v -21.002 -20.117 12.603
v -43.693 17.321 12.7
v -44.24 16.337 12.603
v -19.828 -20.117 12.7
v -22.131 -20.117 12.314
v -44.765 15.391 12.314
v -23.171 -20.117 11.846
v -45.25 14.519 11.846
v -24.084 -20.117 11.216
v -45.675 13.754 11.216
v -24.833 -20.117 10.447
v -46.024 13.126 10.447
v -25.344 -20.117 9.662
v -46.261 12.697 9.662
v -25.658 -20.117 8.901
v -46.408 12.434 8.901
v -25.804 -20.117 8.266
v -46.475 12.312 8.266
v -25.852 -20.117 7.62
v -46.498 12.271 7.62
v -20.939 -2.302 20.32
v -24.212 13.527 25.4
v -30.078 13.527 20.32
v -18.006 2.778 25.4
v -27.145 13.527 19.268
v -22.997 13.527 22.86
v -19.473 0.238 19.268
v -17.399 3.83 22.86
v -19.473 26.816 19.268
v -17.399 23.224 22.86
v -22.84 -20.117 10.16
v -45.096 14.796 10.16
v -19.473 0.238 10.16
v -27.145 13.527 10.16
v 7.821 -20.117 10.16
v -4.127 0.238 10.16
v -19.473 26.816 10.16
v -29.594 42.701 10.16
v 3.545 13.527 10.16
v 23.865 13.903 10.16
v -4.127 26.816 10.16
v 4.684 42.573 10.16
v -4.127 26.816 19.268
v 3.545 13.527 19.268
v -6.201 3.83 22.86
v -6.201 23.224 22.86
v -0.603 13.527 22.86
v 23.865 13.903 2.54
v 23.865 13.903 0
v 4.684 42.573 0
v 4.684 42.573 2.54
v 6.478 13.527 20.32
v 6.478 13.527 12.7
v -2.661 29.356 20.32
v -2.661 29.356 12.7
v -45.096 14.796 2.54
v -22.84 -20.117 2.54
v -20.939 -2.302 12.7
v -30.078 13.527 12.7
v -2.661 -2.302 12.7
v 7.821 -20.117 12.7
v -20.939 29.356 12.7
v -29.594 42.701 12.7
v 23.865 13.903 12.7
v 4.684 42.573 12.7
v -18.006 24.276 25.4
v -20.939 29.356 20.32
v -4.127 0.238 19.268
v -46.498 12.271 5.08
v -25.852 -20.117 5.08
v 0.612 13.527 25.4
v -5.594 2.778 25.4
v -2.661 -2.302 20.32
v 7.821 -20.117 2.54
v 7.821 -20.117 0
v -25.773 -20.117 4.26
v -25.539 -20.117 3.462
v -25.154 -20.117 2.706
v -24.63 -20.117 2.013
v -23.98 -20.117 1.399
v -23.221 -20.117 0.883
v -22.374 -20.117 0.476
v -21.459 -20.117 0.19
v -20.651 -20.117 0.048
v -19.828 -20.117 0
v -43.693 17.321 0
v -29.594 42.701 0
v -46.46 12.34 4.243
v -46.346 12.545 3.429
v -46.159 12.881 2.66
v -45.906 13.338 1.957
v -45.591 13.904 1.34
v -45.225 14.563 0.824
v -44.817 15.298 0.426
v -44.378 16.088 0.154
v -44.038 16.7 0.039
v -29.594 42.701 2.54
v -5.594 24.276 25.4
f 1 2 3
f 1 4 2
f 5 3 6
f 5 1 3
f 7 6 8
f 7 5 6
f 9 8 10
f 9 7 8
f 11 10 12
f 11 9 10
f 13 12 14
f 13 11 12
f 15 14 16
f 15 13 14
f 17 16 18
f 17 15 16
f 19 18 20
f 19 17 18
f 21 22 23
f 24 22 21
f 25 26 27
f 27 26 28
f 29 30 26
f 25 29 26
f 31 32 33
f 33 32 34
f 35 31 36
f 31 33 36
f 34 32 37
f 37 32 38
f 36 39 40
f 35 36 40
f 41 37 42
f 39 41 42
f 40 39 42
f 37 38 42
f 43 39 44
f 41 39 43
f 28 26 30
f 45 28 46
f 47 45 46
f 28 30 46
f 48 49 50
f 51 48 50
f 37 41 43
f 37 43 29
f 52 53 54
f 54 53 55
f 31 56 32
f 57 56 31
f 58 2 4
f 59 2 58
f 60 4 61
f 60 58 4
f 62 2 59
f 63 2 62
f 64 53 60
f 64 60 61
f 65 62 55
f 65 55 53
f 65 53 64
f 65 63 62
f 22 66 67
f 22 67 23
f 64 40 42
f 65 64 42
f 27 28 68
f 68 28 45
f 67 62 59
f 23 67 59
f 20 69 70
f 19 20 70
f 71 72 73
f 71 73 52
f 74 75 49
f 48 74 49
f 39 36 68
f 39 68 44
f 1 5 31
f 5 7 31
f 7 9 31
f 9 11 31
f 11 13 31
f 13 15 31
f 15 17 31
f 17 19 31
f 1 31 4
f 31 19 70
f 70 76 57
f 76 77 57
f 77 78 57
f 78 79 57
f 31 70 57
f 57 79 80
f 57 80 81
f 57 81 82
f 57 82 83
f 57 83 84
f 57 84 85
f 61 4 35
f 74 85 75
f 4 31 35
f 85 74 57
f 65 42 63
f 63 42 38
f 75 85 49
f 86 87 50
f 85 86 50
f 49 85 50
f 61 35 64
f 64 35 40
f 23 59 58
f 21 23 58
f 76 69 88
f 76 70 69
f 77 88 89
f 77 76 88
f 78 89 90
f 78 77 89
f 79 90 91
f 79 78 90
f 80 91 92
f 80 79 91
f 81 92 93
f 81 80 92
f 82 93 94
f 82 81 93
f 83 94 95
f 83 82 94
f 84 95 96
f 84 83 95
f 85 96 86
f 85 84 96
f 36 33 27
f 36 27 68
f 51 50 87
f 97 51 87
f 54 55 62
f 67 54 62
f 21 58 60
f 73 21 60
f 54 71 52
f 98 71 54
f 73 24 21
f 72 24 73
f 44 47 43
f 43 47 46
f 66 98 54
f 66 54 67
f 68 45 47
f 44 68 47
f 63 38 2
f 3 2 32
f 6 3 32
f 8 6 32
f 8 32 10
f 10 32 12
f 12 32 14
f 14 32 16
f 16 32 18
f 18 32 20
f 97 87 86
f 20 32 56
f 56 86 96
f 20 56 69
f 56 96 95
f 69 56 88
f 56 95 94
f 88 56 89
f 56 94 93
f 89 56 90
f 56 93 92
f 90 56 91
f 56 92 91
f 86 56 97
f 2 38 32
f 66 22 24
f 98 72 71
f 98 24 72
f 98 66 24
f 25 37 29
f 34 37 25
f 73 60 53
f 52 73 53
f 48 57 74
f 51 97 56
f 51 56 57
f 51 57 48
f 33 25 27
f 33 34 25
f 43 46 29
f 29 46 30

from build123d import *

# Parameters (mm, degrees)
F1_DEPTH = 12.7
F3_DEPTH = 12.7
F4_SIZE  = 5.08
F5_T     = -2.54
F6_R     = 5.08
F7_R     = 5.08


with BuildPart() as f1:
    # F0 (on Top) → F1 (new body)
    with BuildSketch(Plane.XY):
        Polygon((-29.5936651047, 42.7012435267), (-20.7587903276, 28.1868066845), (-3.0799934127, 28.5968528045), (4.6840362066, 42.572935257), align=None)
        Polygon((-3.0799934127, 28.5968528045), (6.1145154014, 13.4915886278), (23.8648758049, 13.903294608), (4.6840362066, 42.572935257), align=None)
        Polygon((6.1145154014, 13.4915886278), (-2.3697726995, -2.0237216688), (7.8208672829, -20.1170971814), (23.8648758049, 13.903294608), align=None)
        Polygon((-2.3697726995, -2.0237216688), (-20.0485696143, -2.4337677888), (-25.8524047196, -20.1170971814), (7.8208672829, -20.1170971814), align=None)
        Polygon((-25.8524047196, -20.1170971814), (-20.0485696143, -2.4337677888), (-29.2430784284, 12.6714963879), (-46.4981990716, 12.2712771137), align=None)
        Polygon((-46.4981990716, 12.2712771137), (-29.2430784284, 12.6714963879), (-20.7587903276, 28.1868066845), (-29.5936651047, 42.7012435267), align=None)
        Polygon((-29.2430784284, 12.6714963879), (-20.0485696143, -2.4337677888), (-2.3697726995, -2.0237216688), (6.1145154014, 13.4915886278), (-3.0799934127, 28.5968528045), (-20.7587903276, 28.1868066845), align=None)
    extrude(amount=F1_DEPTH)

    # F2 (on face) → F3 (join)
    with BuildSketch(Plane.XY.offset(12.7)):
        Polygon((-20.9390962878, -2.3024461698), (-2.6609753808, -2.3024461698), (6.4780850727, 13.5268708691), (-2.6609753808, 29.356187908), (-20.9390962878, 29.356187908), (-30.0781567413, 13.5268708691), align=None)
    extrude(amount=F3_DEPTH)

    # F4
    f4_edges = [f1.edges().sort_by_distance(p)[0] for p in [
        (1.908555, 5.612212, 25.4),
        (1.908555, 21.441529, 25.4),
        (-11.800036, 29.356188, 25.4),
        (-25.508627, 21.441529, 25.4),
        (-25.508627, 5.612212, 25.4),
        (-11.800036, -2.302446, 25.4),
    ]]
    chamfer(f4_edges, length=F4_SIZE)

    # F5
    f5_openings = [f1.faces().sort_by_distance(p)[0] for p in [
        (15.842872, -3.106901, 6.35),
        (-9.015769, -20.117097, 6.35),
        (14.274456, 28.238115, 6.35),
        (-12.454814, 42.637089, 6.35),
        (-38.045932, 27.48626, 6.35),
    ]]
    offset(amount=F5_T, openings=f5_openings, kind=Kind.INTERSECTION)

    # F6
    f6_edges = [f1.edges().sort_by_distance(p)[0] for p in [
        (-36.175302, -3.92291, 12.7),
    ]]
    fillet(f6_edges, radius=F6_R)

    # F7
    f7_edges = [f1.edges().sort_by_distance(p)[0] for p in [
        (-36.175302, -3.92291, 0),
    ]]
    fillet(f7_edges, radius=F7_R)


solid = f1.part
